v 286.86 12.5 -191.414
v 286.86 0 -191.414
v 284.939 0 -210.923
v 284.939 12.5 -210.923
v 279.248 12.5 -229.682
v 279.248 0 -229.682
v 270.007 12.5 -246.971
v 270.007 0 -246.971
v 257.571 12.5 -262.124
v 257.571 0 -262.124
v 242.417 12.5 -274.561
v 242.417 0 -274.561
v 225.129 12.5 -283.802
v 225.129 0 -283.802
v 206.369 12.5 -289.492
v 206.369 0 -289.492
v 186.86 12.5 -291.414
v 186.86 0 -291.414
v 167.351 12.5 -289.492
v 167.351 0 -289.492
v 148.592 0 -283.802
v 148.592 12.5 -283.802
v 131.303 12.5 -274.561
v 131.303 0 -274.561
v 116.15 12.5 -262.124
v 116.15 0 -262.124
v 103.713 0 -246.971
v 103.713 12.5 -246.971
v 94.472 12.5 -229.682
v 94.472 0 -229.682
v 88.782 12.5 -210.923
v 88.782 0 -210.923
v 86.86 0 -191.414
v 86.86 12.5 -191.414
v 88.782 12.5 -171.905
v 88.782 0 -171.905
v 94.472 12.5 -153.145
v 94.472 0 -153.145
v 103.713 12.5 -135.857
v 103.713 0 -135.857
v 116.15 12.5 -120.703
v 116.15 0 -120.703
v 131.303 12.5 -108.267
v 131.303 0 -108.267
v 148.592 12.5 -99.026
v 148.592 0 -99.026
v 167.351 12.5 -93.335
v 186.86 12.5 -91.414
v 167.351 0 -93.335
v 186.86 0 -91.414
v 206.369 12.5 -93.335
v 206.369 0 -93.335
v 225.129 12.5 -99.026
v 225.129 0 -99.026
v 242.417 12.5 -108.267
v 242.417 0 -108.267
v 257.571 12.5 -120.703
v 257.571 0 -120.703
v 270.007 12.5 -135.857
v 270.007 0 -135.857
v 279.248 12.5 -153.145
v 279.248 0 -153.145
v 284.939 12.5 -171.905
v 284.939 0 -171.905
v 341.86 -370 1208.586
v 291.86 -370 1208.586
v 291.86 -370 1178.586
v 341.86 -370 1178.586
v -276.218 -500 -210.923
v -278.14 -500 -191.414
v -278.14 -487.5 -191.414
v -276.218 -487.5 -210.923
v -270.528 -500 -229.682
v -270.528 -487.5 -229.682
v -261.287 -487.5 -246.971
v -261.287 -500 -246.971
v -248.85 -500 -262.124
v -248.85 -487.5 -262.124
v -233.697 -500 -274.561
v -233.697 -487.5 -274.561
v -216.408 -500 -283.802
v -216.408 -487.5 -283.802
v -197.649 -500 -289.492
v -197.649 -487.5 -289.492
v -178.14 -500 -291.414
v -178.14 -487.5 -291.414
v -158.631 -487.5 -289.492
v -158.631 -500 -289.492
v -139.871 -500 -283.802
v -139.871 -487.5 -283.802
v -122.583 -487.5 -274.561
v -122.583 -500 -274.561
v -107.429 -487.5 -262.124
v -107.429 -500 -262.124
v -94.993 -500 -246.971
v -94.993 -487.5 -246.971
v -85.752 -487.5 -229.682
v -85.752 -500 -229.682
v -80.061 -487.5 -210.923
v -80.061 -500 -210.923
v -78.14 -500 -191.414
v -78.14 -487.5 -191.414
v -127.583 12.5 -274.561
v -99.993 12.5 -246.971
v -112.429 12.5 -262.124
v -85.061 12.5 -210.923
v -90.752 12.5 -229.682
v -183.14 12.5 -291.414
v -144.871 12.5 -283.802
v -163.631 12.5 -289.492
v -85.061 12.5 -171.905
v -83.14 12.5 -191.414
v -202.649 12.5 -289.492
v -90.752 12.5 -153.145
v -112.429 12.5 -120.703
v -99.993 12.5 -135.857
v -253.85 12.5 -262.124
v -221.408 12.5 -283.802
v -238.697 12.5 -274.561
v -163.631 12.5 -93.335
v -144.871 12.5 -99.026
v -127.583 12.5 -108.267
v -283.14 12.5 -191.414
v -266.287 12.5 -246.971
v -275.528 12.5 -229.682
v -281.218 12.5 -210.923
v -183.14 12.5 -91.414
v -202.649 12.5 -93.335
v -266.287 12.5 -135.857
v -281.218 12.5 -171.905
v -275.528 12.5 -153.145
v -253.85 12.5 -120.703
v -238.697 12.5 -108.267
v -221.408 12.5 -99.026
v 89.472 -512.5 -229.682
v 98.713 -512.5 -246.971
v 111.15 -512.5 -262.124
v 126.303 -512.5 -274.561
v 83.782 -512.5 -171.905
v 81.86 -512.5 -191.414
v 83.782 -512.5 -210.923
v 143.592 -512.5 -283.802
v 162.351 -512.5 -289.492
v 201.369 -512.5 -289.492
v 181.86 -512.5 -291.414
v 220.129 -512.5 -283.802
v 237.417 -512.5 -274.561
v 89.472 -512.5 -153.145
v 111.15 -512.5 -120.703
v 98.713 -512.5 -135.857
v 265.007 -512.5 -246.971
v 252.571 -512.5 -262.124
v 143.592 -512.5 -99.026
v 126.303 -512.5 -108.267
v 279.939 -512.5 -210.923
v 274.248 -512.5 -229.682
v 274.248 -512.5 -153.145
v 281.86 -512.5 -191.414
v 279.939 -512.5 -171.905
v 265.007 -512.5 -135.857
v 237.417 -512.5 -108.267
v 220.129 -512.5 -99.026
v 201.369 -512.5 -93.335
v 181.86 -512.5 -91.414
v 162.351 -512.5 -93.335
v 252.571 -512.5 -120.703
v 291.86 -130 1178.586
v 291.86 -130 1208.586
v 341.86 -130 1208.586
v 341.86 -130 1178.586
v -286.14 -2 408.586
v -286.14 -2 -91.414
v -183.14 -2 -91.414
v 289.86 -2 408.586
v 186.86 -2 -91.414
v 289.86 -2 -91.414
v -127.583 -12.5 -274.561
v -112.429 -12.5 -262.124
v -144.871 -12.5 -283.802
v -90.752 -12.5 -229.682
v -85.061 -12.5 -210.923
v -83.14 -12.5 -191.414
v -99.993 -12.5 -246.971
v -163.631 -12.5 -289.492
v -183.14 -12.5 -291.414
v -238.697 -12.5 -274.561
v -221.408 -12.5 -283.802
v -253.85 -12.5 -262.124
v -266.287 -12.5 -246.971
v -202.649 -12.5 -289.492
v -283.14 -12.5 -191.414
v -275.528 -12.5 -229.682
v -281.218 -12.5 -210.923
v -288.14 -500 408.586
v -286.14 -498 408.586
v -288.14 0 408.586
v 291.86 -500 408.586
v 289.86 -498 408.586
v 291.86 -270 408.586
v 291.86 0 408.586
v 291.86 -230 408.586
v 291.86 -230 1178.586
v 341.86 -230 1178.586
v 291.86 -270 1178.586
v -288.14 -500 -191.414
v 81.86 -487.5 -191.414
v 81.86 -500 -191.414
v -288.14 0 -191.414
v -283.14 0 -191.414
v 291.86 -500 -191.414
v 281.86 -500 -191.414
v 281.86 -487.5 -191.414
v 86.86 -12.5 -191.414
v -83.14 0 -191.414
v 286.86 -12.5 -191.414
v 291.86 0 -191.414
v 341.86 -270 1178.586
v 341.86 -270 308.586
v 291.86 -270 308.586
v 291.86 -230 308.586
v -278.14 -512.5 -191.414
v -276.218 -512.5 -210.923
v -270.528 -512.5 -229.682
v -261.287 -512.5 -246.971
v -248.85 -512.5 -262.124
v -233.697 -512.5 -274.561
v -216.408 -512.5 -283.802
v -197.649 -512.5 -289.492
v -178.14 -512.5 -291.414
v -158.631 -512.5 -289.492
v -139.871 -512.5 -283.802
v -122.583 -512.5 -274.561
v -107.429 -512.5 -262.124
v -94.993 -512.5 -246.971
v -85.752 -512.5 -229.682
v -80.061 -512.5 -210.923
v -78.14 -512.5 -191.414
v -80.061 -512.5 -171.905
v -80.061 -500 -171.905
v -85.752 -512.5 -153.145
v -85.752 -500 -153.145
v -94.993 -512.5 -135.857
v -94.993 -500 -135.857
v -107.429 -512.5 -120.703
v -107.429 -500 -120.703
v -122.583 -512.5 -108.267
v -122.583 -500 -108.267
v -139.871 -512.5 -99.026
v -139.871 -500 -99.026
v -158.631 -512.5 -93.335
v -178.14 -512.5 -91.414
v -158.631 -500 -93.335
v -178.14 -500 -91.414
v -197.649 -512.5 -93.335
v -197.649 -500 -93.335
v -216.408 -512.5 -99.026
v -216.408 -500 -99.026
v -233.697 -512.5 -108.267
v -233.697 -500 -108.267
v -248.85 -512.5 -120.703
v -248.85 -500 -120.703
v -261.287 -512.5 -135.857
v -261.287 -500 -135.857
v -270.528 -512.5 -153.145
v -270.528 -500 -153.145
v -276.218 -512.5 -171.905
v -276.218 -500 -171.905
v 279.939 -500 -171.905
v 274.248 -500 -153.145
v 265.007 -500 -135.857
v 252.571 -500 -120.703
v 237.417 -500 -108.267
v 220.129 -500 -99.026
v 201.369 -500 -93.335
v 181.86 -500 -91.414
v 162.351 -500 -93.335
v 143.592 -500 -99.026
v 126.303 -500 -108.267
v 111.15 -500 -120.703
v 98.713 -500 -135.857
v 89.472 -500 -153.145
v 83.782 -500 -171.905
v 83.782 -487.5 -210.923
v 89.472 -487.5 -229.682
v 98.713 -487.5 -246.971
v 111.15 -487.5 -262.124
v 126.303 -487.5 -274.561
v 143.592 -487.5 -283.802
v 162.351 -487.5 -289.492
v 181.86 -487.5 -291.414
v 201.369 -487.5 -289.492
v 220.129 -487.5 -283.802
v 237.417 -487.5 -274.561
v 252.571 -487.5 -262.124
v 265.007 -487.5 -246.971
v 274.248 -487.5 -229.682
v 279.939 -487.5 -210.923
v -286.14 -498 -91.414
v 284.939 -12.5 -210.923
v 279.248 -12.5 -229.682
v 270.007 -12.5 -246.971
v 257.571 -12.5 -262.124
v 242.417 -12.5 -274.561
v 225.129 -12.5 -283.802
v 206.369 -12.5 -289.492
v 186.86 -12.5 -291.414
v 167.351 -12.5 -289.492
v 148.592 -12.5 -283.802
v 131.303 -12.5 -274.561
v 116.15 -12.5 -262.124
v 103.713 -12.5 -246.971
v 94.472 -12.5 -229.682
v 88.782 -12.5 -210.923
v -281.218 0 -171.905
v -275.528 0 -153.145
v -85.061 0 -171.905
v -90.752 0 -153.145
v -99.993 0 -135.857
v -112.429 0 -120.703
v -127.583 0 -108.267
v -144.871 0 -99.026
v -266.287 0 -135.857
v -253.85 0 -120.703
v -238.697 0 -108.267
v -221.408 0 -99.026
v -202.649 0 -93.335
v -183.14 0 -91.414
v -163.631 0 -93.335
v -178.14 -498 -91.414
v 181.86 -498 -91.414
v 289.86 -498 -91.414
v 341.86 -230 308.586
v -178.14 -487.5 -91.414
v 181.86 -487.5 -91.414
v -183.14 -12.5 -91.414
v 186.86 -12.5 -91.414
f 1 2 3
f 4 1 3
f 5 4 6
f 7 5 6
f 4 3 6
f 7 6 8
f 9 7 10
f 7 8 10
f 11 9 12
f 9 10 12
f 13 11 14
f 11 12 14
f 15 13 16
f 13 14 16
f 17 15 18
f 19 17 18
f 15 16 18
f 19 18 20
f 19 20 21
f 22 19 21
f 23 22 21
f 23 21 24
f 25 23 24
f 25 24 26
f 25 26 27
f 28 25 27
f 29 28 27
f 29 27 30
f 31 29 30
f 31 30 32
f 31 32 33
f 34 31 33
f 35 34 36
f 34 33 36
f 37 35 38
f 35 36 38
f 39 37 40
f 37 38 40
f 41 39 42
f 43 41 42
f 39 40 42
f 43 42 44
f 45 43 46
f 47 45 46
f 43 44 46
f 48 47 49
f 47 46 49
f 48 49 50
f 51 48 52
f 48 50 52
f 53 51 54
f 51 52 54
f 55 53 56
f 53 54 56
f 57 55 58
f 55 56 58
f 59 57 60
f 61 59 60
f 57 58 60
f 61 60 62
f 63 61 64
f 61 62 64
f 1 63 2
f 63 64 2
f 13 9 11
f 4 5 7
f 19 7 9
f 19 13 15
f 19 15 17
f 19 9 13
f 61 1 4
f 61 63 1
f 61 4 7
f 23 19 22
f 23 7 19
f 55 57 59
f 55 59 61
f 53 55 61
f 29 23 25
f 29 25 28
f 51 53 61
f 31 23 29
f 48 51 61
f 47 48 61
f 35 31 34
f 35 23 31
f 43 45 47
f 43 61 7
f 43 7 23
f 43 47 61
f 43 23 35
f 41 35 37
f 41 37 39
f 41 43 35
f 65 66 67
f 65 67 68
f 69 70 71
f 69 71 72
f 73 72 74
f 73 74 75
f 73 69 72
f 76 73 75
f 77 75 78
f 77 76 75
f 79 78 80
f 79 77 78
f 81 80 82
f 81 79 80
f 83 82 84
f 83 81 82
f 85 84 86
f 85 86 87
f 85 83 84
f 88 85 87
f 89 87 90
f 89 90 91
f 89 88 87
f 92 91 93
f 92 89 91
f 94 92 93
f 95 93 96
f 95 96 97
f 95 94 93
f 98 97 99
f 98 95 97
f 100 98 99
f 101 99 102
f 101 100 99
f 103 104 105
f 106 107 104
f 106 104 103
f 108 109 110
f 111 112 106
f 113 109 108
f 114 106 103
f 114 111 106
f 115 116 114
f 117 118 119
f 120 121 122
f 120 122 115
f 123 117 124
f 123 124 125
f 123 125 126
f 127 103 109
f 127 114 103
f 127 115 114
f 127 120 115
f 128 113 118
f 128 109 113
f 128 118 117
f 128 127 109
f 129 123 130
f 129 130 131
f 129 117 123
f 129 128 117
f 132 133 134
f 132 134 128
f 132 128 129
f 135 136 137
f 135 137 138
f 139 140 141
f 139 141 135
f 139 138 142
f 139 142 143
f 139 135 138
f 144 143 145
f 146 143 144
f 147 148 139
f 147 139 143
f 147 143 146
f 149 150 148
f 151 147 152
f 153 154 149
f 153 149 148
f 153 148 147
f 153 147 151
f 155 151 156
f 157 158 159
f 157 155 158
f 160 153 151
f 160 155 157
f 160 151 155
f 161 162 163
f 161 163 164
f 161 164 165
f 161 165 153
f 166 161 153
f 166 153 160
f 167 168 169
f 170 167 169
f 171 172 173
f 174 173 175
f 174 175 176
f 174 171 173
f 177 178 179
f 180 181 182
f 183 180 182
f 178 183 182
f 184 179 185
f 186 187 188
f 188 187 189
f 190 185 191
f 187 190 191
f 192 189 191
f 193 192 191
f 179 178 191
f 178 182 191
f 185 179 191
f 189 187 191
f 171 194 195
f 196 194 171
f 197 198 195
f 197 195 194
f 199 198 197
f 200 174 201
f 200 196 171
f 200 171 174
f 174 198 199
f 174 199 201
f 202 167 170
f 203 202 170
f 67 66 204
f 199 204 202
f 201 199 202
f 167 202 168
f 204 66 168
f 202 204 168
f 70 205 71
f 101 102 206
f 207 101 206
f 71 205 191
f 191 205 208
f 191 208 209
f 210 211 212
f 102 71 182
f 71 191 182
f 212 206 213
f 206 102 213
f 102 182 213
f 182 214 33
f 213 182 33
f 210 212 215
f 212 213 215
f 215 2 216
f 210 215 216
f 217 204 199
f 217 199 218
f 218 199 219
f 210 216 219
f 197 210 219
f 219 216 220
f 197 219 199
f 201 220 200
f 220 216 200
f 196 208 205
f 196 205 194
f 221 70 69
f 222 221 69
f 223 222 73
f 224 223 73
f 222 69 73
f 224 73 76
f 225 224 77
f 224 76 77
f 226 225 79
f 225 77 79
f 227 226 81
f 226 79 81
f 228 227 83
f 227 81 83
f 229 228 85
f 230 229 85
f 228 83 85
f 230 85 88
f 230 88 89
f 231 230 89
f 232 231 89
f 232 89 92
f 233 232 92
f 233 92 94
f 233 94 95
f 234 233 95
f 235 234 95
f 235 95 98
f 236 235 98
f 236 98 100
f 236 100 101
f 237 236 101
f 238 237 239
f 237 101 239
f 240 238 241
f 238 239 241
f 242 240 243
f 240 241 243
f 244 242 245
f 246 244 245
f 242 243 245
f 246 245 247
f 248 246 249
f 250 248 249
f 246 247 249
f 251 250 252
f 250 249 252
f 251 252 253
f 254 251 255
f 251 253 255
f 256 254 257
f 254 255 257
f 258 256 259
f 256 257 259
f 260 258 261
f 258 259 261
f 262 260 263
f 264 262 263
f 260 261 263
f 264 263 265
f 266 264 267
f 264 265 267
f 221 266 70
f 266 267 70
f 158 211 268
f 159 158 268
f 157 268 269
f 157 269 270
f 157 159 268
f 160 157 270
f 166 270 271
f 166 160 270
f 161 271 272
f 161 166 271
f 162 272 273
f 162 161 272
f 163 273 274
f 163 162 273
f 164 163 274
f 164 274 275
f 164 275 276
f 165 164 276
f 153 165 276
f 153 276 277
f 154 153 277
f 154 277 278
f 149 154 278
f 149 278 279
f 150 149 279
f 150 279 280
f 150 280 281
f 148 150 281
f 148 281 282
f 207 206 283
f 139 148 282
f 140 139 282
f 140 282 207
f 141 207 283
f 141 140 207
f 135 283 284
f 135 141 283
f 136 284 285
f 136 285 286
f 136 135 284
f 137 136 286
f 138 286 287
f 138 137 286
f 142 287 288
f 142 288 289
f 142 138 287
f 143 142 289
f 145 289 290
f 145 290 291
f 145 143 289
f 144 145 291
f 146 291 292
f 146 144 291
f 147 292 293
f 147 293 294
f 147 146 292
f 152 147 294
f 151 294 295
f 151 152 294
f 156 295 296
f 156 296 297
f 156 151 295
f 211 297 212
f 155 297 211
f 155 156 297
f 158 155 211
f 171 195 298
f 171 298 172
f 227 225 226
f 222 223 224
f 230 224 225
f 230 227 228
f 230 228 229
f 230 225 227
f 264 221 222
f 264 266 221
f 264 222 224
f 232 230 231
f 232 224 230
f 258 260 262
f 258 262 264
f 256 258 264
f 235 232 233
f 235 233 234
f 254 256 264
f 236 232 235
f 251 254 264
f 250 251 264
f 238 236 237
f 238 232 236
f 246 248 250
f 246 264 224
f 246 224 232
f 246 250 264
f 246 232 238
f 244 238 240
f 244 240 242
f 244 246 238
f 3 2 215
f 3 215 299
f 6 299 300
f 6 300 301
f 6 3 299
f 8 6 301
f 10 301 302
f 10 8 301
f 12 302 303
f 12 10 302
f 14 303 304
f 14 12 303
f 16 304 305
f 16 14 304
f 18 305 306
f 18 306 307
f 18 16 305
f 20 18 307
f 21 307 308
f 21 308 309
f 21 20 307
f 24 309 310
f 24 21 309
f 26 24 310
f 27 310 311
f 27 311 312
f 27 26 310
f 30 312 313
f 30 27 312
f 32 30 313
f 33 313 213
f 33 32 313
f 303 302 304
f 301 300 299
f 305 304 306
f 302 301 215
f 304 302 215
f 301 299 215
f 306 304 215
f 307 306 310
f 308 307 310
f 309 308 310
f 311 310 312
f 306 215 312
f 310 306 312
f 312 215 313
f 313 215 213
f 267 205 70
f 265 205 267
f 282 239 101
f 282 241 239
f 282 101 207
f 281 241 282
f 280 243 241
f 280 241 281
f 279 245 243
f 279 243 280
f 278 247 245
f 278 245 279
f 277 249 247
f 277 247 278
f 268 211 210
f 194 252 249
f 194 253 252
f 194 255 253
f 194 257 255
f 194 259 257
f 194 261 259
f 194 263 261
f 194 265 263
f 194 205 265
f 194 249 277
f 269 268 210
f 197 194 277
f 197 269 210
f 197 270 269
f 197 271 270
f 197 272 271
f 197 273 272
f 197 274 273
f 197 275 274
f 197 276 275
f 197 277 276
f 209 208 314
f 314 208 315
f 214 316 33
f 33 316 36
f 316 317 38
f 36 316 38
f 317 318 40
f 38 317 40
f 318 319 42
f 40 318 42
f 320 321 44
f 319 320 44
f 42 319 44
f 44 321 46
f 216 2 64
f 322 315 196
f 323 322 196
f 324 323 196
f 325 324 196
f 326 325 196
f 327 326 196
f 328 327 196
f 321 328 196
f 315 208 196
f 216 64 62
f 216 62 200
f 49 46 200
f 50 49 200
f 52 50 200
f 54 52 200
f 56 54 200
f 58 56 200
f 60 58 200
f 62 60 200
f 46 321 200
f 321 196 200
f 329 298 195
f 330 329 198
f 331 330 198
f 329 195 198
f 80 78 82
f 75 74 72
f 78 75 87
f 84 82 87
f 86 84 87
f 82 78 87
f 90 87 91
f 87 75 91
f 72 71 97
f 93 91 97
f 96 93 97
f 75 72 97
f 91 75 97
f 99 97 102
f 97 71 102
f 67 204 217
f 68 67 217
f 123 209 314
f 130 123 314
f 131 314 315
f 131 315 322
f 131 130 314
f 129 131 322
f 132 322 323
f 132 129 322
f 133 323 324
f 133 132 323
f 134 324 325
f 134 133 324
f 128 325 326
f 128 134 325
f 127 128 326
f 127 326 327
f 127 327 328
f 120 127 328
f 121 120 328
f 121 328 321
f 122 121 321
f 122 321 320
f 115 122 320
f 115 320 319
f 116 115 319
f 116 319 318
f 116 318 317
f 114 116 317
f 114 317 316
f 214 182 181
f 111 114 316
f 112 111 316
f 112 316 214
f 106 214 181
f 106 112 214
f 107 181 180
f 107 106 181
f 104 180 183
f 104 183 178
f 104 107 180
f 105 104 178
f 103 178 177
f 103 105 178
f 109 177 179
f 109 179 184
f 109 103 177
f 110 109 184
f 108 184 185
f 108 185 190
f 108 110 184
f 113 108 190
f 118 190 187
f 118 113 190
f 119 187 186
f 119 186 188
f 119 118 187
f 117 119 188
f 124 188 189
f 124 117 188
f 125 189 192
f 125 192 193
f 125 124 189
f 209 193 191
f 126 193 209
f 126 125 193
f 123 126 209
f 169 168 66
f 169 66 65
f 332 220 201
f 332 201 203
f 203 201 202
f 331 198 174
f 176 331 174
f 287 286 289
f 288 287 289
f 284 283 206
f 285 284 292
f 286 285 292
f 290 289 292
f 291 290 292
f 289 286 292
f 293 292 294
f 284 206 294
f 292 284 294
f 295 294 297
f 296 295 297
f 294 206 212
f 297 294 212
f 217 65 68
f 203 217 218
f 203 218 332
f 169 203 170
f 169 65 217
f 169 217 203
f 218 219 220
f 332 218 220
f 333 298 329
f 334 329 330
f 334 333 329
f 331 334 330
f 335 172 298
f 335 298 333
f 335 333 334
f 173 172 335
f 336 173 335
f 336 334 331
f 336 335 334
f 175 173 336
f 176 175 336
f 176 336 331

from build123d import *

# Parameters (mm, degrees)
F0_W      = 580
F0_H      = 600
F1_DEPTH  = 500
F2_W      = 576
F2_H      = 496
F3_DEPTH  = 500
F4_W      = 40
F4_H      = 800
F4_H_2    = 100
F5_DEPTH  = 50
F6_W      = 50
F6_H      = 100
F7_DEPTH  = 30
F9_DEPTH  = 12.5
F11_DEPTH = 12.5


with BuildPart() as f1:
    # F0 (on Front) → F1 (new body)
    with BuildSketch(Plane.XZ):
        with Locations((1.860235, 108.586439)):
            Rectangle(F0_W, F0_H)
    extrude(amount=F1_DEPTH)

    # F2 (on face) → F3 (cut)
    with BuildSketch(Plane.XY.offset(408.586439)):
        with Locations((1.860235, -250)):
            Rectangle(F2_W, F2_H)
    extrude(amount=-F3_DEPTH, mode=Mode.SUBTRACT)

    # F4 (on face) → F5 (join)
    with BuildSketch(Plane.YZ.offset(291.860235)):
        with Locations((-250, 808.586439)):
            Rectangle(F4_W, F4_H)
        with Locations((-250, 358.586439)):
            Rectangle(F4_W, F4_H_2)
    extrude(amount=F5_DEPTH)

    # F6 (on face) → F7 (join)
    with BuildSketch(Plane.XY.offset(1208.586439)):
        with Locations((316.860235, -320)):
            Rectangle(F6_W, F6_H)
        with Locations((316.860235, -180)):
            Rectangle(F6_W, F6_H)
    extrude(amount=-F7_DEPTH)

    # F8 (on face) → F9 (join, symmetric)
    with BuildSketch(Plane.XZ.offset(500)):
        with BuildLine():
            Line((-278.139765, -191.413561), (-78.139765, -191.413561))
            ThreePointArc((-78.139765, -191.413561), (-178.139765, -91.413561), (-278.139765, -191.413561))
        make_face()
        with BuildLine():
            ThreePointArc((-278.139765, -191.413561), (-178.139765, -291.413561), (-78.139765, -191.413561))
            Line((-78.139765, -191.413561), (-278.139765, -191.413561))
        make_face()
        with BuildLine():
            Line((281.860235, -191.413561), (81.860235, -191.413561))
            ThreePointArc((81.860235, -191.413561), (181.860235, -291.413561), (281.860235, -191.413561))
        make_face()
        with BuildLine():
            ThreePointArc((281.860235, -191.413561), (181.860235, -91.413561), (81.860235, -191.413561))
            Line((81.860235, -191.413561), (281.860235, -191.413561))
        make_face()
    extrude(amount=F9_DEPTH, both=True)

    # F10 (on face) → F11 (join, symmetric)
    with BuildSketch(Plane(origin=(0, 0, 0), x_dir=(-1, 0, 0), z_dir=(0, 1, 0))):
        with BuildLine():
            Line((-286.860235, -191.413561), (-86.860235, -191.413561))
            ThreePointArc((-86.860235, -191.413561), (-186.860235, -91.413561), (-286.860235, -191.413561))
        make_face()
        with BuildLine():
            ThreePointArc((-286.860235, -191.413561), (-186.860235, -291.413561), (-86.860235, -191.413561))
            Line((-86.860235, -191.413561), (-286.860235, -191.413561))
        make_face()
        with BuildLine():
            Line((283.139765, -191.413561), (83.139765, -191.413561))
            ThreePointArc((83.139765, -191.413561), (183.139765, -291.413561), (283.139765, -191.413561))
        make_face()
        with BuildLine():
            ThreePointArc((283.139765, -191.413561), (183.139765, -91.413561), (83.139765, -191.413561))
            Line((83.139765, -191.413561), (283.139765, -191.413561))
        make_face()
    extrude(amount=F11_DEPTH, both=True)


solid = f1.part
